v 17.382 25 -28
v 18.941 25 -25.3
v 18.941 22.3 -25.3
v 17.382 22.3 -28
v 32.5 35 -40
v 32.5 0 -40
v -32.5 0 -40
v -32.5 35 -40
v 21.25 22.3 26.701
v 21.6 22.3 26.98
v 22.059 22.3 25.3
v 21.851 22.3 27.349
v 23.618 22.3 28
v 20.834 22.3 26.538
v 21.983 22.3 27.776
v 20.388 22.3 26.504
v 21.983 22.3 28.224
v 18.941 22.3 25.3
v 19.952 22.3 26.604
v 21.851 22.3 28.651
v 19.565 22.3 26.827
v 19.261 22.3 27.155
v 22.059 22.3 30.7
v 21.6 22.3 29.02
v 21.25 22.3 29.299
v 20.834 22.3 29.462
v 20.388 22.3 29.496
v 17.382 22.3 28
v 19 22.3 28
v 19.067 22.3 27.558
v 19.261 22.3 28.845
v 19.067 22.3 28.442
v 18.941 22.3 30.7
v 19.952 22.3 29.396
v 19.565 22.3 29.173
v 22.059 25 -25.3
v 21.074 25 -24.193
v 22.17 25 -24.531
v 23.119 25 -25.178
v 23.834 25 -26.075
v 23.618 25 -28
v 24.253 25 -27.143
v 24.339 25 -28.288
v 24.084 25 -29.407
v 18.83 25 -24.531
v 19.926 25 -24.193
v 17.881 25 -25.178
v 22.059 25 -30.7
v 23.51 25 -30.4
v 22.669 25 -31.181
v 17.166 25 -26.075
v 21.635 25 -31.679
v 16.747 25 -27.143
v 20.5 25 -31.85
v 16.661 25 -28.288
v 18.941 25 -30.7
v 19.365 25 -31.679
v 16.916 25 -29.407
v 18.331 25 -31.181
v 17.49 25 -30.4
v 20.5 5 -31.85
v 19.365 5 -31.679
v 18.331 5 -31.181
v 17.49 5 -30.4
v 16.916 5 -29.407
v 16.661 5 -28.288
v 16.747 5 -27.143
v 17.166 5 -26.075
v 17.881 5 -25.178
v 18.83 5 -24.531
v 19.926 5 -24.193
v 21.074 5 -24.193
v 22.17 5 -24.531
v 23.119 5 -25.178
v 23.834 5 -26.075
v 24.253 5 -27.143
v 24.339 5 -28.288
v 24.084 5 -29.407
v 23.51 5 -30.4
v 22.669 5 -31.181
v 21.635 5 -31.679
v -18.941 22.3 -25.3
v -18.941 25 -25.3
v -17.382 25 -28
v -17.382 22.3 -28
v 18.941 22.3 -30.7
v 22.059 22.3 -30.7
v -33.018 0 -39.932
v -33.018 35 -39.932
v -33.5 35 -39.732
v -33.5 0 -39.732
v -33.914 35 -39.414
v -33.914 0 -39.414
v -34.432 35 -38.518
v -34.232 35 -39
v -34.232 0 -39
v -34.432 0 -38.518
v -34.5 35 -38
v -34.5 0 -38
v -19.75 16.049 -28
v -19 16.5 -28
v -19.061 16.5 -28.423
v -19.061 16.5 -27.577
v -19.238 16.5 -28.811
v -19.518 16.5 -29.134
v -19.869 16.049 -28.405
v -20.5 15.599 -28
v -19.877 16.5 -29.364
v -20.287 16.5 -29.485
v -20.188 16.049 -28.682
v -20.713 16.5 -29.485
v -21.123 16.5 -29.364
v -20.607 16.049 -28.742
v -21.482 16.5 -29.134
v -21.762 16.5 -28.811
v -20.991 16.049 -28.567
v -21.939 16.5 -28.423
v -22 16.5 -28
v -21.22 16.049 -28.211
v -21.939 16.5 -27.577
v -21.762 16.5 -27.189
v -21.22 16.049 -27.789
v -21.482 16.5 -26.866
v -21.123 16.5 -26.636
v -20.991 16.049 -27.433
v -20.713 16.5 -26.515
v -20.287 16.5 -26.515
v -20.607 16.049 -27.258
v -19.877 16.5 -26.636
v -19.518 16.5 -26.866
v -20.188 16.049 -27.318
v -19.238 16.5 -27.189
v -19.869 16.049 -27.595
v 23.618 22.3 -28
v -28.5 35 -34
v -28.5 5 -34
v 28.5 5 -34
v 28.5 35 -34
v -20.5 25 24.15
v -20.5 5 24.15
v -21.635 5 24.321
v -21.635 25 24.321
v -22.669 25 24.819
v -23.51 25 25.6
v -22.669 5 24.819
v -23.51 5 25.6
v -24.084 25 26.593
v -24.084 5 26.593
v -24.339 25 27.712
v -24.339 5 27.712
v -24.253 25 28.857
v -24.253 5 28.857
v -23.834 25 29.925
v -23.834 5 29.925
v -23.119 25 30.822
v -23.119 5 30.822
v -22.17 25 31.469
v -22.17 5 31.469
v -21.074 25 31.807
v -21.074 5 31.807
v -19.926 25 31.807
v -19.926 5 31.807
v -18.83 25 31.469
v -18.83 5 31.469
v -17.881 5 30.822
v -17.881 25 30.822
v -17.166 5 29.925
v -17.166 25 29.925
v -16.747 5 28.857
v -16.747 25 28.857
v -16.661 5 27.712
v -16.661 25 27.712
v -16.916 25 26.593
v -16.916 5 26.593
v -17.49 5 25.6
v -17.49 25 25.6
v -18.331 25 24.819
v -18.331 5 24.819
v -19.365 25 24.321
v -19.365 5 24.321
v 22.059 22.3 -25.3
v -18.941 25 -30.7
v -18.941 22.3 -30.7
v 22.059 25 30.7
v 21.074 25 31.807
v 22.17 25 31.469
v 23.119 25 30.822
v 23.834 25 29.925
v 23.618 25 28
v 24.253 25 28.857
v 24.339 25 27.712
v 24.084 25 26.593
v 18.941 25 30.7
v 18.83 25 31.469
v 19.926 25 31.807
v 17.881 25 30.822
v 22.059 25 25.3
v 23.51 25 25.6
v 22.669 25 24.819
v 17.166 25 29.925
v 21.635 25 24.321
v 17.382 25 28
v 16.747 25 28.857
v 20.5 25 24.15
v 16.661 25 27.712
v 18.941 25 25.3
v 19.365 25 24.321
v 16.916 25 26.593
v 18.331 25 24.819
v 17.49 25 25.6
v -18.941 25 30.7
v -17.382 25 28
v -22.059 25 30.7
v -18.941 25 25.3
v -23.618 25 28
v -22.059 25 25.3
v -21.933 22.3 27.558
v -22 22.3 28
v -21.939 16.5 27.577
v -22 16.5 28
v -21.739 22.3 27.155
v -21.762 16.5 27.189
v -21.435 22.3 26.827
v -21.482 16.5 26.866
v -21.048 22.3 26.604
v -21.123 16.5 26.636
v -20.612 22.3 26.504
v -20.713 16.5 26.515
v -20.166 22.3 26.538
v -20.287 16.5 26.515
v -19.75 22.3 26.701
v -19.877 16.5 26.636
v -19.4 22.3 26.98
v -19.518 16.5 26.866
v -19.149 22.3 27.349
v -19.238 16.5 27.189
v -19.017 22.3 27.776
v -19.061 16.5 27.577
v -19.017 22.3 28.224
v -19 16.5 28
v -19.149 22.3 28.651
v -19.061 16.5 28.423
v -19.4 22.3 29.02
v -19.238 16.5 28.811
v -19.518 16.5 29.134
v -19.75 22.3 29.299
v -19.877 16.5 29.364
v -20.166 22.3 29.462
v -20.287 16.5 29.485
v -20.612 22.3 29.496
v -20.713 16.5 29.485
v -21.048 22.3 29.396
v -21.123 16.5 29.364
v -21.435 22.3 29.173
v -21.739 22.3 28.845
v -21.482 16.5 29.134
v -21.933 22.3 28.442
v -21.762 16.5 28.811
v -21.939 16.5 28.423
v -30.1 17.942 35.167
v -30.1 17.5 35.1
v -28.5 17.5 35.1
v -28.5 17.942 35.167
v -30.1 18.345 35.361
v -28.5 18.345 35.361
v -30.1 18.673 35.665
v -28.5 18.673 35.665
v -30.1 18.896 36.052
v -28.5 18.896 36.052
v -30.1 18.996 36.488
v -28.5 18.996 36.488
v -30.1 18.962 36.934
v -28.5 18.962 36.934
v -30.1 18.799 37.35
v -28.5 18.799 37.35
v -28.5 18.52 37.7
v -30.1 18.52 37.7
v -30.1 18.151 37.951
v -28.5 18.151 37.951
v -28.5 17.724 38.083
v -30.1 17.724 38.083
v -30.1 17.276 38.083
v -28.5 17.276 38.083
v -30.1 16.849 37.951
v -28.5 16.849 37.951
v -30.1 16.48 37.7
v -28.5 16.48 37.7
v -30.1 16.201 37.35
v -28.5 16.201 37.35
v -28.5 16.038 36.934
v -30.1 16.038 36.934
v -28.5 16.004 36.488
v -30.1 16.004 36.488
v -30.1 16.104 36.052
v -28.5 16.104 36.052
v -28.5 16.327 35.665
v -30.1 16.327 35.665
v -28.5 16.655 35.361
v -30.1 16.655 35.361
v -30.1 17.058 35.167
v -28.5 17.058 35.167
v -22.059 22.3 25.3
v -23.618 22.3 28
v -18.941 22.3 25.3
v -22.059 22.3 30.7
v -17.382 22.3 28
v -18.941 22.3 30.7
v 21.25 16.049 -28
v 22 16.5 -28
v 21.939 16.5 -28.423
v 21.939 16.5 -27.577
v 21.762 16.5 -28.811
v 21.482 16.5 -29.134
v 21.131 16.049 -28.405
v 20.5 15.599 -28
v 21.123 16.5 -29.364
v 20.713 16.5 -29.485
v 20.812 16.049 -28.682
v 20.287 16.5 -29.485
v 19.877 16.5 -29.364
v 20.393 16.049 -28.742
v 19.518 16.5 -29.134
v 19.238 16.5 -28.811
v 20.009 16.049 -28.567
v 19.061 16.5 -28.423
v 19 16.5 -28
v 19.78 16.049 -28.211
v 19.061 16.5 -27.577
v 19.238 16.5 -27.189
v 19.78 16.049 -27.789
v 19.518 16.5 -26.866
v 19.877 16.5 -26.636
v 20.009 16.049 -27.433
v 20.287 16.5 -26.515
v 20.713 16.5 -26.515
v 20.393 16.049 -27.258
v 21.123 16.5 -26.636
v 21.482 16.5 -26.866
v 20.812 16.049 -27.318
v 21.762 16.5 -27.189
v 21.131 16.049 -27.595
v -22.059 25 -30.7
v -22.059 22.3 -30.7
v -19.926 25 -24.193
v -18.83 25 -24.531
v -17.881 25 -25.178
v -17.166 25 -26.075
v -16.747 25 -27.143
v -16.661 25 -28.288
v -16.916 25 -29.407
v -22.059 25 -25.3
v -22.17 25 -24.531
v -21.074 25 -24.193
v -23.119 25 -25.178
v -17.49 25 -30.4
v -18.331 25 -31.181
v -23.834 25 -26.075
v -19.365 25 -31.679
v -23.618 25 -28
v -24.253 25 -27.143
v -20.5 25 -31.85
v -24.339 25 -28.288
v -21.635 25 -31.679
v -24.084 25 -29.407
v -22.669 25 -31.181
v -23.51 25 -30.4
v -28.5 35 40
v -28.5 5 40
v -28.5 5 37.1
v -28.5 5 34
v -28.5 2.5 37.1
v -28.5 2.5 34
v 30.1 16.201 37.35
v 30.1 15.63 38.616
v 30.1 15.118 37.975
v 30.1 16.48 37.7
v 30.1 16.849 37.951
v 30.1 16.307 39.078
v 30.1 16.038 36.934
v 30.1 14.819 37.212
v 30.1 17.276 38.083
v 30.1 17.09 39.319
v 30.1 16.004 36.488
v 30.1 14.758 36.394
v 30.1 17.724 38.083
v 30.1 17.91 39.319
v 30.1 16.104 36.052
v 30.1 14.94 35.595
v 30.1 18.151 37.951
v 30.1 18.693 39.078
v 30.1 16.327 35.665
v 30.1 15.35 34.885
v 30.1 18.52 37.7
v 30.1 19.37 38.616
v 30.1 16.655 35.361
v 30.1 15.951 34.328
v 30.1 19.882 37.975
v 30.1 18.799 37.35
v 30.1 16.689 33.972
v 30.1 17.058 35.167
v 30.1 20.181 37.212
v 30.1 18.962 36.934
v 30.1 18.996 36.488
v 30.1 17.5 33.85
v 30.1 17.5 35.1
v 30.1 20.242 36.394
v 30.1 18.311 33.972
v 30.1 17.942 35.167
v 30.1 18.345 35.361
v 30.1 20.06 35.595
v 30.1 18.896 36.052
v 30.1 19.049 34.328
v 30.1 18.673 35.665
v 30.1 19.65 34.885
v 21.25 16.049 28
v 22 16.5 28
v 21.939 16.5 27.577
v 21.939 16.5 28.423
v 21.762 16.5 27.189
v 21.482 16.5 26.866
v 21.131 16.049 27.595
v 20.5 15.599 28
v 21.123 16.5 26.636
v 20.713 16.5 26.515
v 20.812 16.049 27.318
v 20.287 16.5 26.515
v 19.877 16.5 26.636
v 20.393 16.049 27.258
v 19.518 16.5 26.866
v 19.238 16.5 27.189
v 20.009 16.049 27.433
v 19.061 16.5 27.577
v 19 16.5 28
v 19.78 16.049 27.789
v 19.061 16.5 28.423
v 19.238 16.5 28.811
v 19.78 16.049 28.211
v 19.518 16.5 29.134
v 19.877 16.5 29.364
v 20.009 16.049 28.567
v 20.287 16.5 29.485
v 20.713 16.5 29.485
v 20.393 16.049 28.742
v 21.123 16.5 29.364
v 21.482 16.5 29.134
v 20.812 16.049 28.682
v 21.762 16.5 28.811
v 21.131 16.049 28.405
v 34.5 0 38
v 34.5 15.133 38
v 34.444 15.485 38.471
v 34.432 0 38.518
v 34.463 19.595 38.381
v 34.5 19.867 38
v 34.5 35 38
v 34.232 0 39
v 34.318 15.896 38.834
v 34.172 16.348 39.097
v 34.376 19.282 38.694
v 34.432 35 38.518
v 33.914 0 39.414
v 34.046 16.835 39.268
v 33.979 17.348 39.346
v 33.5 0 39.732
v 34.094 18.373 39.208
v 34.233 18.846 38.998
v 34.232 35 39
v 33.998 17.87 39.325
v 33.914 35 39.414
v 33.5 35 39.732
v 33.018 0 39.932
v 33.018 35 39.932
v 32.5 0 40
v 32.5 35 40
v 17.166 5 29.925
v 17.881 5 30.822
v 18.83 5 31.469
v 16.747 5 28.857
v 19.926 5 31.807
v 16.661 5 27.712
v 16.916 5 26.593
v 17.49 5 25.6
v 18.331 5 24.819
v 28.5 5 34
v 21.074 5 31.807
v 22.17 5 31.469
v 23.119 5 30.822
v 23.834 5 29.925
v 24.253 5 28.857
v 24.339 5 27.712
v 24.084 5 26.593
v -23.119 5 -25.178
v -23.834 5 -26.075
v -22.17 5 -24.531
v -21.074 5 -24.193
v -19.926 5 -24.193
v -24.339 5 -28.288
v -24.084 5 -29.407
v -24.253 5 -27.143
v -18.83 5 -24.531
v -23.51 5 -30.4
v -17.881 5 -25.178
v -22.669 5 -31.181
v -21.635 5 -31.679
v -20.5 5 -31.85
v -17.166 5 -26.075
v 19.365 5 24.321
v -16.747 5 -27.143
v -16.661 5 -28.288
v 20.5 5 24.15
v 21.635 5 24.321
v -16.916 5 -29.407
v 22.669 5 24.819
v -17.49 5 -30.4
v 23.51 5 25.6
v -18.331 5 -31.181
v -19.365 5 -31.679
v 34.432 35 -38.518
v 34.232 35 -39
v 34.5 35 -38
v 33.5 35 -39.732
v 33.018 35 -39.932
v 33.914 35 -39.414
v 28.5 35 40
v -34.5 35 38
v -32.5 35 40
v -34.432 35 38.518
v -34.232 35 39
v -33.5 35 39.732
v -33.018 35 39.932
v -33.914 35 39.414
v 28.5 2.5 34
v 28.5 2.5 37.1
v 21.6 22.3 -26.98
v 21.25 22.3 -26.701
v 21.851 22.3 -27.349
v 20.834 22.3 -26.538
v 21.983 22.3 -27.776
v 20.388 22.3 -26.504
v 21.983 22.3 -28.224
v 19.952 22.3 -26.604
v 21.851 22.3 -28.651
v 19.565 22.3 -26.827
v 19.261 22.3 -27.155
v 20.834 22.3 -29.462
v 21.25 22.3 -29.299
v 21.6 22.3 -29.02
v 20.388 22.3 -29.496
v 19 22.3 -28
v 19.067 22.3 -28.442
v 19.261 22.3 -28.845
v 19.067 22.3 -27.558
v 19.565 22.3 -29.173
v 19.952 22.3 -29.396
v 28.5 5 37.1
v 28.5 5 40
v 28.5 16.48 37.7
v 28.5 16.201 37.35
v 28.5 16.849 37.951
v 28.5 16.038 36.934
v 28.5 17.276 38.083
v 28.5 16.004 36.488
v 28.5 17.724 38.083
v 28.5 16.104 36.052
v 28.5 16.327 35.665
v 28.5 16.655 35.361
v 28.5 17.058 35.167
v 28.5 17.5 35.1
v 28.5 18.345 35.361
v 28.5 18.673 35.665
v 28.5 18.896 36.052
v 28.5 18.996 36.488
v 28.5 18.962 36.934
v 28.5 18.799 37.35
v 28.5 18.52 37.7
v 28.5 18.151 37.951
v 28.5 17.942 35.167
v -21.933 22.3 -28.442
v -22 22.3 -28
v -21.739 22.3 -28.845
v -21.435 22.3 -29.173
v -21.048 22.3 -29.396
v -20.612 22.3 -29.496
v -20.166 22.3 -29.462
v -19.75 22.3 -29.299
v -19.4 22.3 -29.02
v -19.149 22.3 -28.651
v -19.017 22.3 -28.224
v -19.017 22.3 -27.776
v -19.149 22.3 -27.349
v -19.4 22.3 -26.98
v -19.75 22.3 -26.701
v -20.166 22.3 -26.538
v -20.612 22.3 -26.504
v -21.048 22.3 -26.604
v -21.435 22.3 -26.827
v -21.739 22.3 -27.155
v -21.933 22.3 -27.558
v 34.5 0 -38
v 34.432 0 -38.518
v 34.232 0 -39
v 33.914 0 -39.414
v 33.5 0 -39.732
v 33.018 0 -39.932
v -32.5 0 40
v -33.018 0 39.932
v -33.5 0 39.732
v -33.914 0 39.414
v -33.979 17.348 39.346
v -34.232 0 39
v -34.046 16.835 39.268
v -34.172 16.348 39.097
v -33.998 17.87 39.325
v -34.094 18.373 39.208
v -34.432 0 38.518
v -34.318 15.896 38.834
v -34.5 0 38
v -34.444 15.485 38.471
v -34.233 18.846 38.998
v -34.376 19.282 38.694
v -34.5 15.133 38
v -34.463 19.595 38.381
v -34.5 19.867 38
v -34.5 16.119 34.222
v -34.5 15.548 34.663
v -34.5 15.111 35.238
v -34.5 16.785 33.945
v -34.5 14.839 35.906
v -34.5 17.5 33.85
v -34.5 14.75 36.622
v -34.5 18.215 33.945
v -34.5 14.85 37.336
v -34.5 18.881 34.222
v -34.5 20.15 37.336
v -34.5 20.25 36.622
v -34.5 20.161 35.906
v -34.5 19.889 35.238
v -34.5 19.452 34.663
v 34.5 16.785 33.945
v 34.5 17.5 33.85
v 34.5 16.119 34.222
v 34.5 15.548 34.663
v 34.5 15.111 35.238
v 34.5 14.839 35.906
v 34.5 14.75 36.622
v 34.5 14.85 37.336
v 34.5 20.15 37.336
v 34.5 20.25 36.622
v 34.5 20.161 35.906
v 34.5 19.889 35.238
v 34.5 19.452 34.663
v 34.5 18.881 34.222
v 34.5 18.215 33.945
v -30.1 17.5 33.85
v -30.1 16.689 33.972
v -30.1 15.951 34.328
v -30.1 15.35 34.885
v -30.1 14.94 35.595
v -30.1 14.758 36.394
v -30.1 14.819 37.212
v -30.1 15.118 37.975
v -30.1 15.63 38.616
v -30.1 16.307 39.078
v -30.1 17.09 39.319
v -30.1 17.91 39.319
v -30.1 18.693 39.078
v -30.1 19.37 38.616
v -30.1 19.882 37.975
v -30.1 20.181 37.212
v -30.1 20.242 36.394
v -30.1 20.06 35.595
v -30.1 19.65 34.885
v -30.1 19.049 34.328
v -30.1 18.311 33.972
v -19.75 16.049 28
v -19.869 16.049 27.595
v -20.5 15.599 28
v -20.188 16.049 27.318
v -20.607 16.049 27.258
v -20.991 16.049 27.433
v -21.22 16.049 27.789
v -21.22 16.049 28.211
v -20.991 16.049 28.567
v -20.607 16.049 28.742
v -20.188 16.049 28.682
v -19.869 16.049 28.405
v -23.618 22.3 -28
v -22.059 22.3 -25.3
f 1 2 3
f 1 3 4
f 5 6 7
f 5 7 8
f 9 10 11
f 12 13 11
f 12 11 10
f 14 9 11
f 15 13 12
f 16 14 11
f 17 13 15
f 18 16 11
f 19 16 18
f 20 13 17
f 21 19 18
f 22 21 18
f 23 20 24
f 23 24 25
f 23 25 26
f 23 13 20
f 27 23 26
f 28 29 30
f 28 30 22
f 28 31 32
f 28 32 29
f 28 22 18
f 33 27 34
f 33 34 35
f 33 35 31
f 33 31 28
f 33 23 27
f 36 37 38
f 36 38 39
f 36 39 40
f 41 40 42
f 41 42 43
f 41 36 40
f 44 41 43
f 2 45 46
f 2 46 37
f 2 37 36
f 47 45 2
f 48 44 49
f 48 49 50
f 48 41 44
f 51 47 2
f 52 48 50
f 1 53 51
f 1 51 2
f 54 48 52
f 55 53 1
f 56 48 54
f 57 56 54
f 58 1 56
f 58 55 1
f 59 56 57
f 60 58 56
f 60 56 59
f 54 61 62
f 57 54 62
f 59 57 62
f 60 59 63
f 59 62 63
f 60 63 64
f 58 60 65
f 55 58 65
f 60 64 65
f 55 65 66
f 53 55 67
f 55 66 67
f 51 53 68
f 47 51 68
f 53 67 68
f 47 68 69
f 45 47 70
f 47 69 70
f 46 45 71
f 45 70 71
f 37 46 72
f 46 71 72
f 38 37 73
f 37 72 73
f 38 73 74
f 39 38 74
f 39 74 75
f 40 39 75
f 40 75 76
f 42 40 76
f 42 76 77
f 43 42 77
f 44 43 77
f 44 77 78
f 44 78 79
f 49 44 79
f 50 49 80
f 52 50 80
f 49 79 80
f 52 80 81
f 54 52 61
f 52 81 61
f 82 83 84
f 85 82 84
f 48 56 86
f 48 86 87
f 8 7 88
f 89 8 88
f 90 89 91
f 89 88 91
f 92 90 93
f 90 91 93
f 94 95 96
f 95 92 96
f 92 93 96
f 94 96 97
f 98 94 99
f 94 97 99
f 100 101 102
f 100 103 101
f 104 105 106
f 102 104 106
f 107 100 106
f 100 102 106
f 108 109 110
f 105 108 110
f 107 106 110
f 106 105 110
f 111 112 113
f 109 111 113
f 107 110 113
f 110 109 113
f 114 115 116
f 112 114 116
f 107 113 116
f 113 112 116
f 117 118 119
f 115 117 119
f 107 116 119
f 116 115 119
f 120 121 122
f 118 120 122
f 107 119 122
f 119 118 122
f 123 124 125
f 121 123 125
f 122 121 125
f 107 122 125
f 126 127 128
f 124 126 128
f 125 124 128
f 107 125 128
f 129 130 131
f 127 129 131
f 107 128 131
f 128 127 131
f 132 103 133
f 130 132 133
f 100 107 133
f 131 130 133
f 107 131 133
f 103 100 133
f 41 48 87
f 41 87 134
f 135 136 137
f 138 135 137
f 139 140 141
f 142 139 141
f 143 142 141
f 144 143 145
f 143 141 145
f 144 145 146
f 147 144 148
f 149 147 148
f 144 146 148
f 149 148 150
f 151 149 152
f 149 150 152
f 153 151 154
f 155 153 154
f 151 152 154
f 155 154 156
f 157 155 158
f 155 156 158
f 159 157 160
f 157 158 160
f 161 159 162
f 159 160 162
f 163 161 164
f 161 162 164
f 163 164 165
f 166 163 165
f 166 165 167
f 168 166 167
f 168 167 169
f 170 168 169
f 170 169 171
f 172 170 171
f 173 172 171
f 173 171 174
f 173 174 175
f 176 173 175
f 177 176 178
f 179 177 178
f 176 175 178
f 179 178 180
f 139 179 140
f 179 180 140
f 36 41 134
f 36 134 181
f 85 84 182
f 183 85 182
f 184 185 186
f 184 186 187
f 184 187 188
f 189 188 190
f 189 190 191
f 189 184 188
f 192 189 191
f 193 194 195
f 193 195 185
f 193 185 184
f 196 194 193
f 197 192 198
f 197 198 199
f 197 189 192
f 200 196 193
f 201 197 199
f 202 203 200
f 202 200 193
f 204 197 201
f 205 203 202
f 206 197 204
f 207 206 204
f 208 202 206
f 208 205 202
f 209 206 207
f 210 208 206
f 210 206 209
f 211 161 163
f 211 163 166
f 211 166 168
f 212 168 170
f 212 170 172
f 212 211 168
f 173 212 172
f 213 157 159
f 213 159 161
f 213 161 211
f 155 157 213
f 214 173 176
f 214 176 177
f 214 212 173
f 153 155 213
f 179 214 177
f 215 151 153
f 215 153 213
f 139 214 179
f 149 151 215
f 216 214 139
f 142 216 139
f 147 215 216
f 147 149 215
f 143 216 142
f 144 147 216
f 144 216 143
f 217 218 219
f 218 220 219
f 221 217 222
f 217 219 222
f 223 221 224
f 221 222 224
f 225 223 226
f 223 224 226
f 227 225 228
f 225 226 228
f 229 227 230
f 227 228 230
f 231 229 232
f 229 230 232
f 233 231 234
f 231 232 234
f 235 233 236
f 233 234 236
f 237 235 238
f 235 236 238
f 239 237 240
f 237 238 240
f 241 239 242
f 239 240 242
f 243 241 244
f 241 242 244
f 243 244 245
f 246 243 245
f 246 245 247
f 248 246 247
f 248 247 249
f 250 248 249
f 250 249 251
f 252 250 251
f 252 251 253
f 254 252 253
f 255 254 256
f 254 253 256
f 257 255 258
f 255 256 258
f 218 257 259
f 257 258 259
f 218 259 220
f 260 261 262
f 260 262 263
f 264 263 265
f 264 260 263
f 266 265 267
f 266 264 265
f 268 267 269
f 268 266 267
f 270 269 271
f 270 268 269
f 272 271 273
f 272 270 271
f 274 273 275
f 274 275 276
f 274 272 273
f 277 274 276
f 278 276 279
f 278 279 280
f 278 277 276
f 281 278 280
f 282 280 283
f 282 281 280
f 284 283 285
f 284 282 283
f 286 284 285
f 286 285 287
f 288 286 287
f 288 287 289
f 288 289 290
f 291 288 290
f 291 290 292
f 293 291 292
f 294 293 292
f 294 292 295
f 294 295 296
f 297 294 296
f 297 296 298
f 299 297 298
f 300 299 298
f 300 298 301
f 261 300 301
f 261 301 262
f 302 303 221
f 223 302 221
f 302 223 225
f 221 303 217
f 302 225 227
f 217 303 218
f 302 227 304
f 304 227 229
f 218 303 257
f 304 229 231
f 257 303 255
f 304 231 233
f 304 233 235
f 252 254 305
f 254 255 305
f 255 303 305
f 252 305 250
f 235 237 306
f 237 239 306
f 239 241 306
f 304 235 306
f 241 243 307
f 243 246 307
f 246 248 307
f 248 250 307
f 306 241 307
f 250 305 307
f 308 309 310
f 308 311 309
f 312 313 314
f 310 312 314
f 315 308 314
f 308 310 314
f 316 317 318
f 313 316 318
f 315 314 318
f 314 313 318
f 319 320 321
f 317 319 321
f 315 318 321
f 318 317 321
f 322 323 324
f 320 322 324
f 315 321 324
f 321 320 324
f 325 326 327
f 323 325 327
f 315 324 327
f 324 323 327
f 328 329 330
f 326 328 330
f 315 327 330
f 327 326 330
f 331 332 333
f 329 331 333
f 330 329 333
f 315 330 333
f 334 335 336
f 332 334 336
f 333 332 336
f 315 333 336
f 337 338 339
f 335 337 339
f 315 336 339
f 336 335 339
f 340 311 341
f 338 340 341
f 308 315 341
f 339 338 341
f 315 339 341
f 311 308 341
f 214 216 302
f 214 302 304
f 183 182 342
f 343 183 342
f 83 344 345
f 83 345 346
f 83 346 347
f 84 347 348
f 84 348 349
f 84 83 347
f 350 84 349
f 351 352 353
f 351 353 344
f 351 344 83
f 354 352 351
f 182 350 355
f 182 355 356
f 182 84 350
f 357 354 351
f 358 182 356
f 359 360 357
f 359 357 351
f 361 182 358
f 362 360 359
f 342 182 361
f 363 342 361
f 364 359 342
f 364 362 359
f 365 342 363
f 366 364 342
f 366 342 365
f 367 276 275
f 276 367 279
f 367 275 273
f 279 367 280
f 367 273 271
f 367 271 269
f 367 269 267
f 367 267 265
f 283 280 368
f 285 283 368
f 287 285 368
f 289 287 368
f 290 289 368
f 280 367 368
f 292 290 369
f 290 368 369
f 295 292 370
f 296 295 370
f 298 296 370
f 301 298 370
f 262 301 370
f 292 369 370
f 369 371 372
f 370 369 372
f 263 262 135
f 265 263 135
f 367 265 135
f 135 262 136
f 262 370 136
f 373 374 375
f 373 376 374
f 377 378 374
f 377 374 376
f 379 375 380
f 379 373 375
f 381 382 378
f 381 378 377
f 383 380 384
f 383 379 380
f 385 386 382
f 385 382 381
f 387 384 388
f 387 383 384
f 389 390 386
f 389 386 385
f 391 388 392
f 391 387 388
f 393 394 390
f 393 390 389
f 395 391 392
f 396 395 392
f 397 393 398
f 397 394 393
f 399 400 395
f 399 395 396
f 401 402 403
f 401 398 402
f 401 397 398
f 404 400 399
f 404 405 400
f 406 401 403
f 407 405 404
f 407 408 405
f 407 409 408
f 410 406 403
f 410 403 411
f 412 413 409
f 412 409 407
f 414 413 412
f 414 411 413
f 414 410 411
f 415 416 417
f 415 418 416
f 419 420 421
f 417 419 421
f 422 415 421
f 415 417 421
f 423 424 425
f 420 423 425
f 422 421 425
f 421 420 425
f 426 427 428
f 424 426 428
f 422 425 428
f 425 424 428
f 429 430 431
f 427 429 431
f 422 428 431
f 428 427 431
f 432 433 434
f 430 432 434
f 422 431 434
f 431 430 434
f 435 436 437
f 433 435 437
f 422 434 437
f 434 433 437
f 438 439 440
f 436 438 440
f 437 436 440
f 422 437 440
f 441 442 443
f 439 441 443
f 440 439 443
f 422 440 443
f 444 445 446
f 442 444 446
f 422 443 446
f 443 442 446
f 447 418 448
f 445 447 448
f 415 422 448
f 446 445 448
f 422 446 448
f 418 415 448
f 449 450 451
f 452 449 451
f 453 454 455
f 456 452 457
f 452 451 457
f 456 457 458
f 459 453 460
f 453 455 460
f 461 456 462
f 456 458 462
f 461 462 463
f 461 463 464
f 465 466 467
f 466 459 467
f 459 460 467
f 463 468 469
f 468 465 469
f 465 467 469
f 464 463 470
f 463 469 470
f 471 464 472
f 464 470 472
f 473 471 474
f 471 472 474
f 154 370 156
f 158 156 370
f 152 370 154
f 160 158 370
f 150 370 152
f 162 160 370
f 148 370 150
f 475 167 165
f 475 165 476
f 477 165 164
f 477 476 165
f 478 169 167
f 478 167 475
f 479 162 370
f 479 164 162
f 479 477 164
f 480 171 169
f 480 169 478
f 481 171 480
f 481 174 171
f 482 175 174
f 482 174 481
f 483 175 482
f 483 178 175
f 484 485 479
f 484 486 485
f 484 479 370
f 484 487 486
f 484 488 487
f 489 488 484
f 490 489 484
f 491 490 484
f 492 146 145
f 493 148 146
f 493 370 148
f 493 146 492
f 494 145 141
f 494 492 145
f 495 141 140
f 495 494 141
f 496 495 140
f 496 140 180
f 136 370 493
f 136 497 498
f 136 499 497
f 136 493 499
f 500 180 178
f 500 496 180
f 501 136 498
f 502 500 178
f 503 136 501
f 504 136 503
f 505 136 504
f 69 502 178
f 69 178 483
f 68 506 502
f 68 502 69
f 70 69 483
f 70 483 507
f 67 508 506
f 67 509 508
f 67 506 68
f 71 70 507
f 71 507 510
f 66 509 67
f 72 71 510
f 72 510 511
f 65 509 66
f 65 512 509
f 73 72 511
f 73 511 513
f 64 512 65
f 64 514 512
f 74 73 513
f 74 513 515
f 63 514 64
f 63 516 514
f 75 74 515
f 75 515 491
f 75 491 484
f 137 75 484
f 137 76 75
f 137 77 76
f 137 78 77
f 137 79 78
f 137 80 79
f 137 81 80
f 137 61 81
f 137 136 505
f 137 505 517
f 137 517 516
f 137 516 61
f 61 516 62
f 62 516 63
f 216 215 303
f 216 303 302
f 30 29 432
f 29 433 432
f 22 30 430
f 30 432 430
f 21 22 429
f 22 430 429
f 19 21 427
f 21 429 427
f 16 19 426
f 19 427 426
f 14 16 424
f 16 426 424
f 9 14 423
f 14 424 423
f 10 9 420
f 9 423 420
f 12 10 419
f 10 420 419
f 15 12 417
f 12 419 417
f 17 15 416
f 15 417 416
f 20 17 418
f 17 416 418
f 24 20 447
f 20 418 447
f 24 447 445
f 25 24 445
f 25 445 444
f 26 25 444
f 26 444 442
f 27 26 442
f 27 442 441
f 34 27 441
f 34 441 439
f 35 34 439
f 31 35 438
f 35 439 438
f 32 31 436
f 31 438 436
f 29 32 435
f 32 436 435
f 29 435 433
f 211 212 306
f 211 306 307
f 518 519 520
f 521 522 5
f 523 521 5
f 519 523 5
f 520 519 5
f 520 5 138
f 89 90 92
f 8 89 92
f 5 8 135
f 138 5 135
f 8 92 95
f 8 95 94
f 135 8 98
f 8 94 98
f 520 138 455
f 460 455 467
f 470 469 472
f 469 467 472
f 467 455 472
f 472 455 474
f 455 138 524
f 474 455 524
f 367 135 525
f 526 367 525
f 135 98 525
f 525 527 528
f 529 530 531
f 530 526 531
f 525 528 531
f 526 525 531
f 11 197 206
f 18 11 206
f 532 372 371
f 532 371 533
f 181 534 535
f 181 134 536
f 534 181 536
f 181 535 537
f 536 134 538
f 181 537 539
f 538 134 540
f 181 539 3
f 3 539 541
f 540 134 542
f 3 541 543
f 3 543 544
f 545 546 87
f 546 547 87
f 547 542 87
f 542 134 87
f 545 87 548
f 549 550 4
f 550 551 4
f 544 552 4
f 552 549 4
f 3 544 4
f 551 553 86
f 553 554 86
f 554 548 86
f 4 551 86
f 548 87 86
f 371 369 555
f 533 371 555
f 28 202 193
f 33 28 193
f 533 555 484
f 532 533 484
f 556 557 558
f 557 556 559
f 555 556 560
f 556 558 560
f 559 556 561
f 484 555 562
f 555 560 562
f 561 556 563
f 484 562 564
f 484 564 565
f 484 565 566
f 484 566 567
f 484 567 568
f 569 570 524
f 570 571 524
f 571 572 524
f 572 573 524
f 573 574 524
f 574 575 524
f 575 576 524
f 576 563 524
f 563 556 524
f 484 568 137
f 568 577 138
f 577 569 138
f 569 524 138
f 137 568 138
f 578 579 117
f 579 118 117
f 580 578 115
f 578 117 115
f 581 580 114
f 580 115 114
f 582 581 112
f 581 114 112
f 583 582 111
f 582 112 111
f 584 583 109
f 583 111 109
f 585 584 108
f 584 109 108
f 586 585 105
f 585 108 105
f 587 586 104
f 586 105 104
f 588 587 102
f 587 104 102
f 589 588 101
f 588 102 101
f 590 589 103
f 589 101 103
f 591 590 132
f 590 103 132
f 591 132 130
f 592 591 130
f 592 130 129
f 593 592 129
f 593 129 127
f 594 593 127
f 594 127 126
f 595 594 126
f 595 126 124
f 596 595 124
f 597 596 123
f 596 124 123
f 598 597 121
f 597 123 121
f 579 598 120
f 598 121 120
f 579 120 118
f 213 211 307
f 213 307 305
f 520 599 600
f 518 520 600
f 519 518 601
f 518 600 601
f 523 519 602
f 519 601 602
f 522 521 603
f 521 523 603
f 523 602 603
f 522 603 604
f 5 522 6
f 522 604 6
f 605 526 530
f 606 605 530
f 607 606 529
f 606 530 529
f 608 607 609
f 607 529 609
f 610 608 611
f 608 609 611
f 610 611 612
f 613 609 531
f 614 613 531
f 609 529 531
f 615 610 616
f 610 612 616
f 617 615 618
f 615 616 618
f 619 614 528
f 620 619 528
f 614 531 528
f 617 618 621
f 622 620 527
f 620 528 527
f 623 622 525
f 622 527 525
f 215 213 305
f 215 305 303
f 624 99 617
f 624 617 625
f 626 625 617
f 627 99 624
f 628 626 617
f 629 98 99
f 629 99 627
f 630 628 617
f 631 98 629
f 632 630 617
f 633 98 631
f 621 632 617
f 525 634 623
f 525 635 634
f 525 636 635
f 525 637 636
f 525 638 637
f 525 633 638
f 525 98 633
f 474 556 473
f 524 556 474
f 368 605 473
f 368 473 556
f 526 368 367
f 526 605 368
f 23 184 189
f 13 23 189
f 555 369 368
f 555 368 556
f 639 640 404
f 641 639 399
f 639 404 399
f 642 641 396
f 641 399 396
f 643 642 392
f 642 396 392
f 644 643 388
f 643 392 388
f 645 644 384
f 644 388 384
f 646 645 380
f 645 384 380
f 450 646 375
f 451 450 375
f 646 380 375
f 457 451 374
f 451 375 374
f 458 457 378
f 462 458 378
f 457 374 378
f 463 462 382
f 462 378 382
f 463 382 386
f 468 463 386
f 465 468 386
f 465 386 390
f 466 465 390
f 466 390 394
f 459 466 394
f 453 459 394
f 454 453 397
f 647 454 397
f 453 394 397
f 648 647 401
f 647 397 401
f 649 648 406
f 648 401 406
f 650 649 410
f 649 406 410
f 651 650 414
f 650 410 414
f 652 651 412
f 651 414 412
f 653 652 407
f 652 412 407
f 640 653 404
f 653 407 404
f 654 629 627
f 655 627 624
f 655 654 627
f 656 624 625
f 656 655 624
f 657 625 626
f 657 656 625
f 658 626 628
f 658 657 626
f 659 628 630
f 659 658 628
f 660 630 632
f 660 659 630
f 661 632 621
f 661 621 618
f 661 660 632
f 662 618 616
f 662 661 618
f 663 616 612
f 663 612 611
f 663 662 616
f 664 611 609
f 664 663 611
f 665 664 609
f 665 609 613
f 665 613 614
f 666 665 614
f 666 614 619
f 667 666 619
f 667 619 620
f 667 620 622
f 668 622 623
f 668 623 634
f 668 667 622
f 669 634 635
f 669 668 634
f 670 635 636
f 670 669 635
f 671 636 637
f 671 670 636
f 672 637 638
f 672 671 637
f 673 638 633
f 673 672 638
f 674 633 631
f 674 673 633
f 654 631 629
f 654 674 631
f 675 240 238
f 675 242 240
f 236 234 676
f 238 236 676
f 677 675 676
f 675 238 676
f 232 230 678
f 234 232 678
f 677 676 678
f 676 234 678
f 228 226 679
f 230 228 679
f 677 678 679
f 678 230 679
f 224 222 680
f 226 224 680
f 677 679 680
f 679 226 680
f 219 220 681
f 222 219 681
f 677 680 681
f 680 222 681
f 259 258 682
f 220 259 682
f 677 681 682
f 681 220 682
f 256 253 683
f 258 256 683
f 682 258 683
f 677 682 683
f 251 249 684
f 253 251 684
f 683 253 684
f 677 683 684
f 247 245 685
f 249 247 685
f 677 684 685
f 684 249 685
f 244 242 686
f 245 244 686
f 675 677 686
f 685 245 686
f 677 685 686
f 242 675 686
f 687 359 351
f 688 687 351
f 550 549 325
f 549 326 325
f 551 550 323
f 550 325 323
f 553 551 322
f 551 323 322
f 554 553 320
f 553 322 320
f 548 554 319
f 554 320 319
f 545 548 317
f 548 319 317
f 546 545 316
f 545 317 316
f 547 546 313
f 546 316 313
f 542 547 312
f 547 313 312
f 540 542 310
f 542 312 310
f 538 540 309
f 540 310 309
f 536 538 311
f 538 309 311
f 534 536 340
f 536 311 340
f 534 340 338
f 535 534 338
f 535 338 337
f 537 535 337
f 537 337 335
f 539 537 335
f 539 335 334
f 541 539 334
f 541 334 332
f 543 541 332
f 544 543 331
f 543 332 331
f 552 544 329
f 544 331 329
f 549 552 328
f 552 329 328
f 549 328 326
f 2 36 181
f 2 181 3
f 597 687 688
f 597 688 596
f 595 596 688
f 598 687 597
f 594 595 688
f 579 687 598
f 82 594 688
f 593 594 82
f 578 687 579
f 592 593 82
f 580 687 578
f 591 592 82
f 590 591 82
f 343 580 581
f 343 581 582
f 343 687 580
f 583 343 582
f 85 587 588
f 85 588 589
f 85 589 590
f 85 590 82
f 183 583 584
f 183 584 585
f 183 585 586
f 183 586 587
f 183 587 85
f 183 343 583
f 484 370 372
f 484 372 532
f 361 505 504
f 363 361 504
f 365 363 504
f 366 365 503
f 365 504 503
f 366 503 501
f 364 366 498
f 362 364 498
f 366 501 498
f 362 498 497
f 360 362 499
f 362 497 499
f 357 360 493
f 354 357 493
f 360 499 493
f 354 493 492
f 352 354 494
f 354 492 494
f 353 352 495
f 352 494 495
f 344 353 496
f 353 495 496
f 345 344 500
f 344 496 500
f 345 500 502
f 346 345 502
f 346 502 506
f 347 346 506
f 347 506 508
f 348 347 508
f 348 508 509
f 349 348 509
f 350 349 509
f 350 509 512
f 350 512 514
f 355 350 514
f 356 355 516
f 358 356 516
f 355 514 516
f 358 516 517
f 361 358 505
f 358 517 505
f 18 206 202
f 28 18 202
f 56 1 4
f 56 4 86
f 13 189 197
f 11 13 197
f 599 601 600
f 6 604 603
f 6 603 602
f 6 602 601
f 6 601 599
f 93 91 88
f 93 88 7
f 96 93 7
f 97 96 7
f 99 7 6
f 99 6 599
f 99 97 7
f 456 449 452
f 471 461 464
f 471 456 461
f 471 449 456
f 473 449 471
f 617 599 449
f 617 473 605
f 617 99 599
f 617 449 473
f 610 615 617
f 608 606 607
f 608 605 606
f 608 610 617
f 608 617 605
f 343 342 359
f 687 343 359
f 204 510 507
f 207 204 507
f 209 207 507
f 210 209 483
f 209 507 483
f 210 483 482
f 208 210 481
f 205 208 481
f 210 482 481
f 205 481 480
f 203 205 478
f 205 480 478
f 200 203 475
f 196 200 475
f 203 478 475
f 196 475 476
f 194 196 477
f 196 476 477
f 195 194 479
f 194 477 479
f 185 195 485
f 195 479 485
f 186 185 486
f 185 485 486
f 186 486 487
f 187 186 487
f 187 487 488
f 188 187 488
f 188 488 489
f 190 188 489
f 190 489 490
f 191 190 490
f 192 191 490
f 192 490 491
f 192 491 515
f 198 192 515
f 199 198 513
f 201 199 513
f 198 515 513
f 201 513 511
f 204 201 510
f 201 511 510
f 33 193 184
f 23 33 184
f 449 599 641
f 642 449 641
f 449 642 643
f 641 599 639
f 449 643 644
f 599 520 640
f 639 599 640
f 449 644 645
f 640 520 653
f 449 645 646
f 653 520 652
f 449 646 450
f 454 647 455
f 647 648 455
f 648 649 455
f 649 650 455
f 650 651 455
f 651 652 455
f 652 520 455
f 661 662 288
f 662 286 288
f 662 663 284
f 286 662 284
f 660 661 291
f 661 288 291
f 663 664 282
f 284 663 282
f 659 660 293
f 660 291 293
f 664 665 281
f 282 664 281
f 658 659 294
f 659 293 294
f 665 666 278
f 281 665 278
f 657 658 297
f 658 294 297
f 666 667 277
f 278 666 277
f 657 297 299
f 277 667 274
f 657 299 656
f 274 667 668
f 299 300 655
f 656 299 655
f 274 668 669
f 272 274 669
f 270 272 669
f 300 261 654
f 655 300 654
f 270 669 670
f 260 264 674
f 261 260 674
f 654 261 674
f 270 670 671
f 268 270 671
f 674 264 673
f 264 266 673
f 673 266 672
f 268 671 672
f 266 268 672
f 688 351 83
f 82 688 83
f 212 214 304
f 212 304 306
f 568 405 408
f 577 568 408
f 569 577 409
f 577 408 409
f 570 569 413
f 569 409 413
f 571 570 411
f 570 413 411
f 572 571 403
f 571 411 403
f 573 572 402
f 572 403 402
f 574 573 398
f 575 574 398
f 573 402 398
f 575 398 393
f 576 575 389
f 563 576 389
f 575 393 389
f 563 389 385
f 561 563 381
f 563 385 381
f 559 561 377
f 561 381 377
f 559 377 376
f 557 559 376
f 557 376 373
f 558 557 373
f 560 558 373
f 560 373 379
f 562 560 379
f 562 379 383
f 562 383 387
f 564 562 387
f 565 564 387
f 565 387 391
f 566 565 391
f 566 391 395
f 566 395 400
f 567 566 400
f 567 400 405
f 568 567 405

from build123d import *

# Parameters (mm, degrees)
SKETCH1_W                                = 65
SKETCH1_H                                = 80
BOSS_EXTRUDE1_DEPTH                      = 5
SKETCH2_W                                = 65
SKETCH2_H                                = 80
SKETCH2_W_2                              = 57
SKETCH2_H_2                              = 68
BOSS_EXTRUDE2_DEPTH                      = 30
SKETCH3_R                                = 3.85
BOSS_EXTRUDE3_DEPTH                      = 20
F_3_0MM_DOWEL_HOLE1_D                    = 3
F_3_0MM_DOWEL_HOLE1_DEPTH                = 8.5
F_3_0MM_DOWEL_HOLE1_CSINK_D              = 3.05
F_3_0MM_DOWEL_HOLE1_CSINK_ANGLE          = 90
F_3_0MM_DOWEL_HOLE1_TIP                  = 0.901290929
CUT_EXTRUDE1_DEPTH                       = 2.7
MIRROR1_AT_THE_SECOND_PLANE_COPY_1_DEPTH = 2.7
SKETCH13_R                               = 2.75
CUT_EXTRUDE4_DEPTH                       = 2.4
SKETCH14_R                               = 1.5
CUT_EXTRUDE5_DEPTH                       = 4
SKETCH11_W                               = 57
SKETCH11_H                               = 6
CUT_EXTRUDE2_DEPTH                       = 30
SKETCH15_W                               = 57
SKETCH15_H                               = 3.1
CUT_EXTRUDE6_DEPTH                       = 2.5
SKETCH16_W                               = 80
SKETCH16_H                               = 35
SKETCH16_R                               = 2.75
BOSS_EXTRUDE4_DEPTH                      = 2
FILLET1_R                                = 2


with BuildPart() as part:
    # Sketch1 → Boss-Extrude1 (new body)
    with BuildSketch(Plane(origin=(0, 0, 0), x_dir=(1, 0, 0), z_dir=(0, 1, 0))):
        Rectangle(SKETCH1_W, SKETCH1_H)
    extrude(amount=BOSS_EXTRUDE1_DEPTH)

    # Sketch2 → Boss-Extrude2 (add)
    with BuildSketch(Plane(origin=(0, 5, 0), x_dir=(1, 0, 0), z_dir=(0, 1, 0))):
        Rectangle(SKETCH2_W, SKETCH2_H)
        Rectangle(SKETCH2_W_2, SKETCH2_H_2, mode=Mode.SUBTRACT)
    extrude(amount=BOSS_EXTRUDE2_DEPTH)

    # Sketch3 → Boss-Extrude3 (add)
    with BuildSketch(Plane(origin=(0, 5, 0), x_dir=(1, 0, 0), z_dir=(0, 1, 0))):
        with Locations(Location((-20.5, -28, 0), (0, 0, 90))):
            Circle(SKETCH3_R)
        with Locations(Location((20.5, -28, 0), (0, 0, 90))):
            Circle(SKETCH3_R)
        with Locations(Location((20.5, 28, 0), (0, 0, 90))):
            Circle(SKETCH3_R)
        with Locations(Location((-20.5, 28, 0), (0, 0, 90))):
            Circle(SKETCH3_R)
    extrude(amount=BOSS_EXTRUDE3_DEPTH)

    # Ø3.0mm Dowel Hole1
    with Locations(Plane(origin=(0, 25, 0), x_dir=(1, 0, 0), z_dir=(0, 1, 0))):
        with Locations((-20.5, 28), (20.5, 28), (20.5, -28), (-20.5, -28)):
            CounterSinkHole(F_3_0MM_DOWEL_HOLE1_D / 2, F_3_0MM_DOWEL_HOLE1_CSINK_D / 2, depth=F_3_0MM_DOWEL_HOLE1_DEPTH, counter_sink_angle=F_3_0MM_DOWEL_HOLE1_CSINK_ANGLE)
            with Locations((0, 0, -(F_3_0MM_DOWEL_HOLE1_DEPTH + F_3_0MM_DOWEL_HOLE1_TIP / 2))):  # 118° drill point
                Cone(0, F_3_0MM_DOWEL_HOLE1_D / 2, F_3_0MM_DOWEL_HOLE1_TIP, mode=Mode.SUBTRACT)

    # Sketch8 → Cut-Extrude1 (cut)
    with BuildSketch(Plane(origin=(0, 25, 0), x_dir=(1, 0, 0), z_dir=(0, 1, 0))):
        Polygon((-17.382308546, 28), (-18.941154273, 30.7), (-22.058845727, 30.7), (-23.617691454, 28), (-22.058845727, 25.3), (-18.941154273, 25.3), align=None)
    cut_extrude1 = extrude(amount=-CUT_EXTRUDE1_DEPTH, mode=Mode.SUBTRACT)

    # Mirror1: Cut-Extrude1 across plane
    add(cut_extrude1.mirror(Plane.XY), mode=Mode.SUBTRACT)

    # Mirror1 at the second plane: Cut-Extrude1 across plane
    add(cut_extrude1.mirror(Plane(origin=(0, 0, 0), x_dir=(0, 0, 1), z_dir=(1, 0, 0))), mode=Mode.SUBTRACT)

    # Mirror1 at the second plane copy 1 sketc → Mirror1 at the second plane copy 1 (cut)
    with BuildSketch(Plane(origin=(0, 25, 0), x_dir=(-1, 0, 0), z_dir=(0, 1, 0))):
        Polygon((-17.382308546, 28), (-18.941154273, 30.7), (-22.058845727, 30.7), (-23.617691454, 28), (-22.058845727, 25.3), (-18.941154273, 25.3), align=None)
    extrude(amount=-MIRROR1_AT_THE_SECOND_PLANE_COPY_1_DEPTH, mode=Mode.SUBTRACT)

    # Sketch13 → Cut-Extrude4 (cut)
    with BuildSketch(Plane(origin=(32.5, 0, 0), x_dir=(0, 0, -1), z_dir=(1, 0, 0))):
        with Locations((-36.6, 17.5)):
            Circle(SKETCH13_R)
    cut_extrude4 = extrude(amount=-CUT_EXTRUDE4_DEPTH, mode=Mode.SUBTRACT)

    # Sketch14 → Cut-Extrude5 (cut)
    with BuildSketch(Plane(origin=(32.5, 0, 0), x_dir=(0, 0, -1), z_dir=(1, 0, 0))):
        with Locations((-36.6, 17.5)):
            Circle(SKETCH14_R)
    cut_extrude5 = extrude(amount=-CUT_EXTRUDE5_DEPTH, mode=Mode.SUBTRACT)

    # Mirror2: Cut-Extrude4, Cut-Extrude5 across plane
    add(cut_extrude4.mirror(Plane(origin=(0, 0, 0), x_dir=(0, 0, 1), z_dir=(1, 0, 0))), mode=Mode.SUBTRACT)
    add(cut_extrude5.mirror(Plane(origin=(0, 0, 0), x_dir=(0, 0, 1), z_dir=(1, 0, 0))), mode=Mode.SUBTRACT)

    # Sketch11 → Cut-Extrude2 (cut)
    with BuildSketch(Plane(origin=(0, 35, 0), x_dir=(1, 0, 0), z_dir=(0, 1, 0))):
        with Locations((0, -37)):
            Rectangle(SKETCH11_W, SKETCH11_H)
    extrude(amount=-CUT_EXTRUDE2_DEPTH, mode=Mode.SUBTRACT)

    # Sketch15 → Cut-Extrude6 (cut)
    with BuildSketch(Plane(origin=(0, 5, 0), x_dir=(1, 0, 0), z_dir=(0, 1, 0))):
        with Locations((0, -35.55)):
            Rectangle(SKETCH15_W, SKETCH15_H)
    extrude(amount=-CUT_EXTRUDE6_DEPTH, mode=Mode.SUBTRACT)

    # Sketch16 → Boss-Extrude4 (add)
    with BuildSketch(Plane.ZY.offset(32.5)):
        with Locations((0, 17.5)):
            Rectangle(SKETCH16_W, SKETCH16_H)
        with Locations(Location((36.6, 17.5, 0), (0, 0, 180))):
            Circle(SKETCH16_R, mode=Mode.SUBTRACT)
    boss_extrude4 = extrude(amount=BOSS_EXTRUDE4_DEPTH)

    # Mirror3: Boss-Extrude4 across plane
    add(boss_extrude4.mirror(Plane(origin=(0, 0, 0), x_dir=(0, 0, 1), z_dir=(1, 0, 0))))

    # Fillet1
    # the kernel refuses this fillet: 2 mm, written as the material it takes off along each edge
    with BuildSketch(Plane(origin=(-34.5, -5, -40), x_dir=(1, 0, 0), z_dir=(0, 1, 0)), Plane(origin=(-34.5, 40, 40), x_dir=(1, 0, 0), z_dir=(0, -1, 0)), Plane(origin=(34.5, -5, -40), x_dir=(0, 0, 1), z_dir=(0, 1, 0))) as fillet1_piece_1:
        with BuildLine():
            CenterArc((FILLET1_R, -FILLET1_R), FILLET1_R, 90, 90)
            Line((0, -FILLET1_R), (0, 0))
            Line((0, 0), (FILLET1_R, 0))
        make_face()
    extrude(amount=45, mode=Mode.SUBTRACT)
    with BuildSketch(Plane(origin=(34.5, 40, 40), x_dir=(-1, 0, 0), z_dir=(0, -1, 0))) as fillet1_piece_2:
        with BuildLine():
            CenterArc((FILLET1_R, FILLET1_R), FILLET1_R, 180, 90)
            Line((0, FILLET1_R), (0, 0))
            Line((0, 0), (FILLET1_R, 0))
        make_face()
    extrude(amount=45, mode=Mode.SUBTRACT)


solid = part.part
